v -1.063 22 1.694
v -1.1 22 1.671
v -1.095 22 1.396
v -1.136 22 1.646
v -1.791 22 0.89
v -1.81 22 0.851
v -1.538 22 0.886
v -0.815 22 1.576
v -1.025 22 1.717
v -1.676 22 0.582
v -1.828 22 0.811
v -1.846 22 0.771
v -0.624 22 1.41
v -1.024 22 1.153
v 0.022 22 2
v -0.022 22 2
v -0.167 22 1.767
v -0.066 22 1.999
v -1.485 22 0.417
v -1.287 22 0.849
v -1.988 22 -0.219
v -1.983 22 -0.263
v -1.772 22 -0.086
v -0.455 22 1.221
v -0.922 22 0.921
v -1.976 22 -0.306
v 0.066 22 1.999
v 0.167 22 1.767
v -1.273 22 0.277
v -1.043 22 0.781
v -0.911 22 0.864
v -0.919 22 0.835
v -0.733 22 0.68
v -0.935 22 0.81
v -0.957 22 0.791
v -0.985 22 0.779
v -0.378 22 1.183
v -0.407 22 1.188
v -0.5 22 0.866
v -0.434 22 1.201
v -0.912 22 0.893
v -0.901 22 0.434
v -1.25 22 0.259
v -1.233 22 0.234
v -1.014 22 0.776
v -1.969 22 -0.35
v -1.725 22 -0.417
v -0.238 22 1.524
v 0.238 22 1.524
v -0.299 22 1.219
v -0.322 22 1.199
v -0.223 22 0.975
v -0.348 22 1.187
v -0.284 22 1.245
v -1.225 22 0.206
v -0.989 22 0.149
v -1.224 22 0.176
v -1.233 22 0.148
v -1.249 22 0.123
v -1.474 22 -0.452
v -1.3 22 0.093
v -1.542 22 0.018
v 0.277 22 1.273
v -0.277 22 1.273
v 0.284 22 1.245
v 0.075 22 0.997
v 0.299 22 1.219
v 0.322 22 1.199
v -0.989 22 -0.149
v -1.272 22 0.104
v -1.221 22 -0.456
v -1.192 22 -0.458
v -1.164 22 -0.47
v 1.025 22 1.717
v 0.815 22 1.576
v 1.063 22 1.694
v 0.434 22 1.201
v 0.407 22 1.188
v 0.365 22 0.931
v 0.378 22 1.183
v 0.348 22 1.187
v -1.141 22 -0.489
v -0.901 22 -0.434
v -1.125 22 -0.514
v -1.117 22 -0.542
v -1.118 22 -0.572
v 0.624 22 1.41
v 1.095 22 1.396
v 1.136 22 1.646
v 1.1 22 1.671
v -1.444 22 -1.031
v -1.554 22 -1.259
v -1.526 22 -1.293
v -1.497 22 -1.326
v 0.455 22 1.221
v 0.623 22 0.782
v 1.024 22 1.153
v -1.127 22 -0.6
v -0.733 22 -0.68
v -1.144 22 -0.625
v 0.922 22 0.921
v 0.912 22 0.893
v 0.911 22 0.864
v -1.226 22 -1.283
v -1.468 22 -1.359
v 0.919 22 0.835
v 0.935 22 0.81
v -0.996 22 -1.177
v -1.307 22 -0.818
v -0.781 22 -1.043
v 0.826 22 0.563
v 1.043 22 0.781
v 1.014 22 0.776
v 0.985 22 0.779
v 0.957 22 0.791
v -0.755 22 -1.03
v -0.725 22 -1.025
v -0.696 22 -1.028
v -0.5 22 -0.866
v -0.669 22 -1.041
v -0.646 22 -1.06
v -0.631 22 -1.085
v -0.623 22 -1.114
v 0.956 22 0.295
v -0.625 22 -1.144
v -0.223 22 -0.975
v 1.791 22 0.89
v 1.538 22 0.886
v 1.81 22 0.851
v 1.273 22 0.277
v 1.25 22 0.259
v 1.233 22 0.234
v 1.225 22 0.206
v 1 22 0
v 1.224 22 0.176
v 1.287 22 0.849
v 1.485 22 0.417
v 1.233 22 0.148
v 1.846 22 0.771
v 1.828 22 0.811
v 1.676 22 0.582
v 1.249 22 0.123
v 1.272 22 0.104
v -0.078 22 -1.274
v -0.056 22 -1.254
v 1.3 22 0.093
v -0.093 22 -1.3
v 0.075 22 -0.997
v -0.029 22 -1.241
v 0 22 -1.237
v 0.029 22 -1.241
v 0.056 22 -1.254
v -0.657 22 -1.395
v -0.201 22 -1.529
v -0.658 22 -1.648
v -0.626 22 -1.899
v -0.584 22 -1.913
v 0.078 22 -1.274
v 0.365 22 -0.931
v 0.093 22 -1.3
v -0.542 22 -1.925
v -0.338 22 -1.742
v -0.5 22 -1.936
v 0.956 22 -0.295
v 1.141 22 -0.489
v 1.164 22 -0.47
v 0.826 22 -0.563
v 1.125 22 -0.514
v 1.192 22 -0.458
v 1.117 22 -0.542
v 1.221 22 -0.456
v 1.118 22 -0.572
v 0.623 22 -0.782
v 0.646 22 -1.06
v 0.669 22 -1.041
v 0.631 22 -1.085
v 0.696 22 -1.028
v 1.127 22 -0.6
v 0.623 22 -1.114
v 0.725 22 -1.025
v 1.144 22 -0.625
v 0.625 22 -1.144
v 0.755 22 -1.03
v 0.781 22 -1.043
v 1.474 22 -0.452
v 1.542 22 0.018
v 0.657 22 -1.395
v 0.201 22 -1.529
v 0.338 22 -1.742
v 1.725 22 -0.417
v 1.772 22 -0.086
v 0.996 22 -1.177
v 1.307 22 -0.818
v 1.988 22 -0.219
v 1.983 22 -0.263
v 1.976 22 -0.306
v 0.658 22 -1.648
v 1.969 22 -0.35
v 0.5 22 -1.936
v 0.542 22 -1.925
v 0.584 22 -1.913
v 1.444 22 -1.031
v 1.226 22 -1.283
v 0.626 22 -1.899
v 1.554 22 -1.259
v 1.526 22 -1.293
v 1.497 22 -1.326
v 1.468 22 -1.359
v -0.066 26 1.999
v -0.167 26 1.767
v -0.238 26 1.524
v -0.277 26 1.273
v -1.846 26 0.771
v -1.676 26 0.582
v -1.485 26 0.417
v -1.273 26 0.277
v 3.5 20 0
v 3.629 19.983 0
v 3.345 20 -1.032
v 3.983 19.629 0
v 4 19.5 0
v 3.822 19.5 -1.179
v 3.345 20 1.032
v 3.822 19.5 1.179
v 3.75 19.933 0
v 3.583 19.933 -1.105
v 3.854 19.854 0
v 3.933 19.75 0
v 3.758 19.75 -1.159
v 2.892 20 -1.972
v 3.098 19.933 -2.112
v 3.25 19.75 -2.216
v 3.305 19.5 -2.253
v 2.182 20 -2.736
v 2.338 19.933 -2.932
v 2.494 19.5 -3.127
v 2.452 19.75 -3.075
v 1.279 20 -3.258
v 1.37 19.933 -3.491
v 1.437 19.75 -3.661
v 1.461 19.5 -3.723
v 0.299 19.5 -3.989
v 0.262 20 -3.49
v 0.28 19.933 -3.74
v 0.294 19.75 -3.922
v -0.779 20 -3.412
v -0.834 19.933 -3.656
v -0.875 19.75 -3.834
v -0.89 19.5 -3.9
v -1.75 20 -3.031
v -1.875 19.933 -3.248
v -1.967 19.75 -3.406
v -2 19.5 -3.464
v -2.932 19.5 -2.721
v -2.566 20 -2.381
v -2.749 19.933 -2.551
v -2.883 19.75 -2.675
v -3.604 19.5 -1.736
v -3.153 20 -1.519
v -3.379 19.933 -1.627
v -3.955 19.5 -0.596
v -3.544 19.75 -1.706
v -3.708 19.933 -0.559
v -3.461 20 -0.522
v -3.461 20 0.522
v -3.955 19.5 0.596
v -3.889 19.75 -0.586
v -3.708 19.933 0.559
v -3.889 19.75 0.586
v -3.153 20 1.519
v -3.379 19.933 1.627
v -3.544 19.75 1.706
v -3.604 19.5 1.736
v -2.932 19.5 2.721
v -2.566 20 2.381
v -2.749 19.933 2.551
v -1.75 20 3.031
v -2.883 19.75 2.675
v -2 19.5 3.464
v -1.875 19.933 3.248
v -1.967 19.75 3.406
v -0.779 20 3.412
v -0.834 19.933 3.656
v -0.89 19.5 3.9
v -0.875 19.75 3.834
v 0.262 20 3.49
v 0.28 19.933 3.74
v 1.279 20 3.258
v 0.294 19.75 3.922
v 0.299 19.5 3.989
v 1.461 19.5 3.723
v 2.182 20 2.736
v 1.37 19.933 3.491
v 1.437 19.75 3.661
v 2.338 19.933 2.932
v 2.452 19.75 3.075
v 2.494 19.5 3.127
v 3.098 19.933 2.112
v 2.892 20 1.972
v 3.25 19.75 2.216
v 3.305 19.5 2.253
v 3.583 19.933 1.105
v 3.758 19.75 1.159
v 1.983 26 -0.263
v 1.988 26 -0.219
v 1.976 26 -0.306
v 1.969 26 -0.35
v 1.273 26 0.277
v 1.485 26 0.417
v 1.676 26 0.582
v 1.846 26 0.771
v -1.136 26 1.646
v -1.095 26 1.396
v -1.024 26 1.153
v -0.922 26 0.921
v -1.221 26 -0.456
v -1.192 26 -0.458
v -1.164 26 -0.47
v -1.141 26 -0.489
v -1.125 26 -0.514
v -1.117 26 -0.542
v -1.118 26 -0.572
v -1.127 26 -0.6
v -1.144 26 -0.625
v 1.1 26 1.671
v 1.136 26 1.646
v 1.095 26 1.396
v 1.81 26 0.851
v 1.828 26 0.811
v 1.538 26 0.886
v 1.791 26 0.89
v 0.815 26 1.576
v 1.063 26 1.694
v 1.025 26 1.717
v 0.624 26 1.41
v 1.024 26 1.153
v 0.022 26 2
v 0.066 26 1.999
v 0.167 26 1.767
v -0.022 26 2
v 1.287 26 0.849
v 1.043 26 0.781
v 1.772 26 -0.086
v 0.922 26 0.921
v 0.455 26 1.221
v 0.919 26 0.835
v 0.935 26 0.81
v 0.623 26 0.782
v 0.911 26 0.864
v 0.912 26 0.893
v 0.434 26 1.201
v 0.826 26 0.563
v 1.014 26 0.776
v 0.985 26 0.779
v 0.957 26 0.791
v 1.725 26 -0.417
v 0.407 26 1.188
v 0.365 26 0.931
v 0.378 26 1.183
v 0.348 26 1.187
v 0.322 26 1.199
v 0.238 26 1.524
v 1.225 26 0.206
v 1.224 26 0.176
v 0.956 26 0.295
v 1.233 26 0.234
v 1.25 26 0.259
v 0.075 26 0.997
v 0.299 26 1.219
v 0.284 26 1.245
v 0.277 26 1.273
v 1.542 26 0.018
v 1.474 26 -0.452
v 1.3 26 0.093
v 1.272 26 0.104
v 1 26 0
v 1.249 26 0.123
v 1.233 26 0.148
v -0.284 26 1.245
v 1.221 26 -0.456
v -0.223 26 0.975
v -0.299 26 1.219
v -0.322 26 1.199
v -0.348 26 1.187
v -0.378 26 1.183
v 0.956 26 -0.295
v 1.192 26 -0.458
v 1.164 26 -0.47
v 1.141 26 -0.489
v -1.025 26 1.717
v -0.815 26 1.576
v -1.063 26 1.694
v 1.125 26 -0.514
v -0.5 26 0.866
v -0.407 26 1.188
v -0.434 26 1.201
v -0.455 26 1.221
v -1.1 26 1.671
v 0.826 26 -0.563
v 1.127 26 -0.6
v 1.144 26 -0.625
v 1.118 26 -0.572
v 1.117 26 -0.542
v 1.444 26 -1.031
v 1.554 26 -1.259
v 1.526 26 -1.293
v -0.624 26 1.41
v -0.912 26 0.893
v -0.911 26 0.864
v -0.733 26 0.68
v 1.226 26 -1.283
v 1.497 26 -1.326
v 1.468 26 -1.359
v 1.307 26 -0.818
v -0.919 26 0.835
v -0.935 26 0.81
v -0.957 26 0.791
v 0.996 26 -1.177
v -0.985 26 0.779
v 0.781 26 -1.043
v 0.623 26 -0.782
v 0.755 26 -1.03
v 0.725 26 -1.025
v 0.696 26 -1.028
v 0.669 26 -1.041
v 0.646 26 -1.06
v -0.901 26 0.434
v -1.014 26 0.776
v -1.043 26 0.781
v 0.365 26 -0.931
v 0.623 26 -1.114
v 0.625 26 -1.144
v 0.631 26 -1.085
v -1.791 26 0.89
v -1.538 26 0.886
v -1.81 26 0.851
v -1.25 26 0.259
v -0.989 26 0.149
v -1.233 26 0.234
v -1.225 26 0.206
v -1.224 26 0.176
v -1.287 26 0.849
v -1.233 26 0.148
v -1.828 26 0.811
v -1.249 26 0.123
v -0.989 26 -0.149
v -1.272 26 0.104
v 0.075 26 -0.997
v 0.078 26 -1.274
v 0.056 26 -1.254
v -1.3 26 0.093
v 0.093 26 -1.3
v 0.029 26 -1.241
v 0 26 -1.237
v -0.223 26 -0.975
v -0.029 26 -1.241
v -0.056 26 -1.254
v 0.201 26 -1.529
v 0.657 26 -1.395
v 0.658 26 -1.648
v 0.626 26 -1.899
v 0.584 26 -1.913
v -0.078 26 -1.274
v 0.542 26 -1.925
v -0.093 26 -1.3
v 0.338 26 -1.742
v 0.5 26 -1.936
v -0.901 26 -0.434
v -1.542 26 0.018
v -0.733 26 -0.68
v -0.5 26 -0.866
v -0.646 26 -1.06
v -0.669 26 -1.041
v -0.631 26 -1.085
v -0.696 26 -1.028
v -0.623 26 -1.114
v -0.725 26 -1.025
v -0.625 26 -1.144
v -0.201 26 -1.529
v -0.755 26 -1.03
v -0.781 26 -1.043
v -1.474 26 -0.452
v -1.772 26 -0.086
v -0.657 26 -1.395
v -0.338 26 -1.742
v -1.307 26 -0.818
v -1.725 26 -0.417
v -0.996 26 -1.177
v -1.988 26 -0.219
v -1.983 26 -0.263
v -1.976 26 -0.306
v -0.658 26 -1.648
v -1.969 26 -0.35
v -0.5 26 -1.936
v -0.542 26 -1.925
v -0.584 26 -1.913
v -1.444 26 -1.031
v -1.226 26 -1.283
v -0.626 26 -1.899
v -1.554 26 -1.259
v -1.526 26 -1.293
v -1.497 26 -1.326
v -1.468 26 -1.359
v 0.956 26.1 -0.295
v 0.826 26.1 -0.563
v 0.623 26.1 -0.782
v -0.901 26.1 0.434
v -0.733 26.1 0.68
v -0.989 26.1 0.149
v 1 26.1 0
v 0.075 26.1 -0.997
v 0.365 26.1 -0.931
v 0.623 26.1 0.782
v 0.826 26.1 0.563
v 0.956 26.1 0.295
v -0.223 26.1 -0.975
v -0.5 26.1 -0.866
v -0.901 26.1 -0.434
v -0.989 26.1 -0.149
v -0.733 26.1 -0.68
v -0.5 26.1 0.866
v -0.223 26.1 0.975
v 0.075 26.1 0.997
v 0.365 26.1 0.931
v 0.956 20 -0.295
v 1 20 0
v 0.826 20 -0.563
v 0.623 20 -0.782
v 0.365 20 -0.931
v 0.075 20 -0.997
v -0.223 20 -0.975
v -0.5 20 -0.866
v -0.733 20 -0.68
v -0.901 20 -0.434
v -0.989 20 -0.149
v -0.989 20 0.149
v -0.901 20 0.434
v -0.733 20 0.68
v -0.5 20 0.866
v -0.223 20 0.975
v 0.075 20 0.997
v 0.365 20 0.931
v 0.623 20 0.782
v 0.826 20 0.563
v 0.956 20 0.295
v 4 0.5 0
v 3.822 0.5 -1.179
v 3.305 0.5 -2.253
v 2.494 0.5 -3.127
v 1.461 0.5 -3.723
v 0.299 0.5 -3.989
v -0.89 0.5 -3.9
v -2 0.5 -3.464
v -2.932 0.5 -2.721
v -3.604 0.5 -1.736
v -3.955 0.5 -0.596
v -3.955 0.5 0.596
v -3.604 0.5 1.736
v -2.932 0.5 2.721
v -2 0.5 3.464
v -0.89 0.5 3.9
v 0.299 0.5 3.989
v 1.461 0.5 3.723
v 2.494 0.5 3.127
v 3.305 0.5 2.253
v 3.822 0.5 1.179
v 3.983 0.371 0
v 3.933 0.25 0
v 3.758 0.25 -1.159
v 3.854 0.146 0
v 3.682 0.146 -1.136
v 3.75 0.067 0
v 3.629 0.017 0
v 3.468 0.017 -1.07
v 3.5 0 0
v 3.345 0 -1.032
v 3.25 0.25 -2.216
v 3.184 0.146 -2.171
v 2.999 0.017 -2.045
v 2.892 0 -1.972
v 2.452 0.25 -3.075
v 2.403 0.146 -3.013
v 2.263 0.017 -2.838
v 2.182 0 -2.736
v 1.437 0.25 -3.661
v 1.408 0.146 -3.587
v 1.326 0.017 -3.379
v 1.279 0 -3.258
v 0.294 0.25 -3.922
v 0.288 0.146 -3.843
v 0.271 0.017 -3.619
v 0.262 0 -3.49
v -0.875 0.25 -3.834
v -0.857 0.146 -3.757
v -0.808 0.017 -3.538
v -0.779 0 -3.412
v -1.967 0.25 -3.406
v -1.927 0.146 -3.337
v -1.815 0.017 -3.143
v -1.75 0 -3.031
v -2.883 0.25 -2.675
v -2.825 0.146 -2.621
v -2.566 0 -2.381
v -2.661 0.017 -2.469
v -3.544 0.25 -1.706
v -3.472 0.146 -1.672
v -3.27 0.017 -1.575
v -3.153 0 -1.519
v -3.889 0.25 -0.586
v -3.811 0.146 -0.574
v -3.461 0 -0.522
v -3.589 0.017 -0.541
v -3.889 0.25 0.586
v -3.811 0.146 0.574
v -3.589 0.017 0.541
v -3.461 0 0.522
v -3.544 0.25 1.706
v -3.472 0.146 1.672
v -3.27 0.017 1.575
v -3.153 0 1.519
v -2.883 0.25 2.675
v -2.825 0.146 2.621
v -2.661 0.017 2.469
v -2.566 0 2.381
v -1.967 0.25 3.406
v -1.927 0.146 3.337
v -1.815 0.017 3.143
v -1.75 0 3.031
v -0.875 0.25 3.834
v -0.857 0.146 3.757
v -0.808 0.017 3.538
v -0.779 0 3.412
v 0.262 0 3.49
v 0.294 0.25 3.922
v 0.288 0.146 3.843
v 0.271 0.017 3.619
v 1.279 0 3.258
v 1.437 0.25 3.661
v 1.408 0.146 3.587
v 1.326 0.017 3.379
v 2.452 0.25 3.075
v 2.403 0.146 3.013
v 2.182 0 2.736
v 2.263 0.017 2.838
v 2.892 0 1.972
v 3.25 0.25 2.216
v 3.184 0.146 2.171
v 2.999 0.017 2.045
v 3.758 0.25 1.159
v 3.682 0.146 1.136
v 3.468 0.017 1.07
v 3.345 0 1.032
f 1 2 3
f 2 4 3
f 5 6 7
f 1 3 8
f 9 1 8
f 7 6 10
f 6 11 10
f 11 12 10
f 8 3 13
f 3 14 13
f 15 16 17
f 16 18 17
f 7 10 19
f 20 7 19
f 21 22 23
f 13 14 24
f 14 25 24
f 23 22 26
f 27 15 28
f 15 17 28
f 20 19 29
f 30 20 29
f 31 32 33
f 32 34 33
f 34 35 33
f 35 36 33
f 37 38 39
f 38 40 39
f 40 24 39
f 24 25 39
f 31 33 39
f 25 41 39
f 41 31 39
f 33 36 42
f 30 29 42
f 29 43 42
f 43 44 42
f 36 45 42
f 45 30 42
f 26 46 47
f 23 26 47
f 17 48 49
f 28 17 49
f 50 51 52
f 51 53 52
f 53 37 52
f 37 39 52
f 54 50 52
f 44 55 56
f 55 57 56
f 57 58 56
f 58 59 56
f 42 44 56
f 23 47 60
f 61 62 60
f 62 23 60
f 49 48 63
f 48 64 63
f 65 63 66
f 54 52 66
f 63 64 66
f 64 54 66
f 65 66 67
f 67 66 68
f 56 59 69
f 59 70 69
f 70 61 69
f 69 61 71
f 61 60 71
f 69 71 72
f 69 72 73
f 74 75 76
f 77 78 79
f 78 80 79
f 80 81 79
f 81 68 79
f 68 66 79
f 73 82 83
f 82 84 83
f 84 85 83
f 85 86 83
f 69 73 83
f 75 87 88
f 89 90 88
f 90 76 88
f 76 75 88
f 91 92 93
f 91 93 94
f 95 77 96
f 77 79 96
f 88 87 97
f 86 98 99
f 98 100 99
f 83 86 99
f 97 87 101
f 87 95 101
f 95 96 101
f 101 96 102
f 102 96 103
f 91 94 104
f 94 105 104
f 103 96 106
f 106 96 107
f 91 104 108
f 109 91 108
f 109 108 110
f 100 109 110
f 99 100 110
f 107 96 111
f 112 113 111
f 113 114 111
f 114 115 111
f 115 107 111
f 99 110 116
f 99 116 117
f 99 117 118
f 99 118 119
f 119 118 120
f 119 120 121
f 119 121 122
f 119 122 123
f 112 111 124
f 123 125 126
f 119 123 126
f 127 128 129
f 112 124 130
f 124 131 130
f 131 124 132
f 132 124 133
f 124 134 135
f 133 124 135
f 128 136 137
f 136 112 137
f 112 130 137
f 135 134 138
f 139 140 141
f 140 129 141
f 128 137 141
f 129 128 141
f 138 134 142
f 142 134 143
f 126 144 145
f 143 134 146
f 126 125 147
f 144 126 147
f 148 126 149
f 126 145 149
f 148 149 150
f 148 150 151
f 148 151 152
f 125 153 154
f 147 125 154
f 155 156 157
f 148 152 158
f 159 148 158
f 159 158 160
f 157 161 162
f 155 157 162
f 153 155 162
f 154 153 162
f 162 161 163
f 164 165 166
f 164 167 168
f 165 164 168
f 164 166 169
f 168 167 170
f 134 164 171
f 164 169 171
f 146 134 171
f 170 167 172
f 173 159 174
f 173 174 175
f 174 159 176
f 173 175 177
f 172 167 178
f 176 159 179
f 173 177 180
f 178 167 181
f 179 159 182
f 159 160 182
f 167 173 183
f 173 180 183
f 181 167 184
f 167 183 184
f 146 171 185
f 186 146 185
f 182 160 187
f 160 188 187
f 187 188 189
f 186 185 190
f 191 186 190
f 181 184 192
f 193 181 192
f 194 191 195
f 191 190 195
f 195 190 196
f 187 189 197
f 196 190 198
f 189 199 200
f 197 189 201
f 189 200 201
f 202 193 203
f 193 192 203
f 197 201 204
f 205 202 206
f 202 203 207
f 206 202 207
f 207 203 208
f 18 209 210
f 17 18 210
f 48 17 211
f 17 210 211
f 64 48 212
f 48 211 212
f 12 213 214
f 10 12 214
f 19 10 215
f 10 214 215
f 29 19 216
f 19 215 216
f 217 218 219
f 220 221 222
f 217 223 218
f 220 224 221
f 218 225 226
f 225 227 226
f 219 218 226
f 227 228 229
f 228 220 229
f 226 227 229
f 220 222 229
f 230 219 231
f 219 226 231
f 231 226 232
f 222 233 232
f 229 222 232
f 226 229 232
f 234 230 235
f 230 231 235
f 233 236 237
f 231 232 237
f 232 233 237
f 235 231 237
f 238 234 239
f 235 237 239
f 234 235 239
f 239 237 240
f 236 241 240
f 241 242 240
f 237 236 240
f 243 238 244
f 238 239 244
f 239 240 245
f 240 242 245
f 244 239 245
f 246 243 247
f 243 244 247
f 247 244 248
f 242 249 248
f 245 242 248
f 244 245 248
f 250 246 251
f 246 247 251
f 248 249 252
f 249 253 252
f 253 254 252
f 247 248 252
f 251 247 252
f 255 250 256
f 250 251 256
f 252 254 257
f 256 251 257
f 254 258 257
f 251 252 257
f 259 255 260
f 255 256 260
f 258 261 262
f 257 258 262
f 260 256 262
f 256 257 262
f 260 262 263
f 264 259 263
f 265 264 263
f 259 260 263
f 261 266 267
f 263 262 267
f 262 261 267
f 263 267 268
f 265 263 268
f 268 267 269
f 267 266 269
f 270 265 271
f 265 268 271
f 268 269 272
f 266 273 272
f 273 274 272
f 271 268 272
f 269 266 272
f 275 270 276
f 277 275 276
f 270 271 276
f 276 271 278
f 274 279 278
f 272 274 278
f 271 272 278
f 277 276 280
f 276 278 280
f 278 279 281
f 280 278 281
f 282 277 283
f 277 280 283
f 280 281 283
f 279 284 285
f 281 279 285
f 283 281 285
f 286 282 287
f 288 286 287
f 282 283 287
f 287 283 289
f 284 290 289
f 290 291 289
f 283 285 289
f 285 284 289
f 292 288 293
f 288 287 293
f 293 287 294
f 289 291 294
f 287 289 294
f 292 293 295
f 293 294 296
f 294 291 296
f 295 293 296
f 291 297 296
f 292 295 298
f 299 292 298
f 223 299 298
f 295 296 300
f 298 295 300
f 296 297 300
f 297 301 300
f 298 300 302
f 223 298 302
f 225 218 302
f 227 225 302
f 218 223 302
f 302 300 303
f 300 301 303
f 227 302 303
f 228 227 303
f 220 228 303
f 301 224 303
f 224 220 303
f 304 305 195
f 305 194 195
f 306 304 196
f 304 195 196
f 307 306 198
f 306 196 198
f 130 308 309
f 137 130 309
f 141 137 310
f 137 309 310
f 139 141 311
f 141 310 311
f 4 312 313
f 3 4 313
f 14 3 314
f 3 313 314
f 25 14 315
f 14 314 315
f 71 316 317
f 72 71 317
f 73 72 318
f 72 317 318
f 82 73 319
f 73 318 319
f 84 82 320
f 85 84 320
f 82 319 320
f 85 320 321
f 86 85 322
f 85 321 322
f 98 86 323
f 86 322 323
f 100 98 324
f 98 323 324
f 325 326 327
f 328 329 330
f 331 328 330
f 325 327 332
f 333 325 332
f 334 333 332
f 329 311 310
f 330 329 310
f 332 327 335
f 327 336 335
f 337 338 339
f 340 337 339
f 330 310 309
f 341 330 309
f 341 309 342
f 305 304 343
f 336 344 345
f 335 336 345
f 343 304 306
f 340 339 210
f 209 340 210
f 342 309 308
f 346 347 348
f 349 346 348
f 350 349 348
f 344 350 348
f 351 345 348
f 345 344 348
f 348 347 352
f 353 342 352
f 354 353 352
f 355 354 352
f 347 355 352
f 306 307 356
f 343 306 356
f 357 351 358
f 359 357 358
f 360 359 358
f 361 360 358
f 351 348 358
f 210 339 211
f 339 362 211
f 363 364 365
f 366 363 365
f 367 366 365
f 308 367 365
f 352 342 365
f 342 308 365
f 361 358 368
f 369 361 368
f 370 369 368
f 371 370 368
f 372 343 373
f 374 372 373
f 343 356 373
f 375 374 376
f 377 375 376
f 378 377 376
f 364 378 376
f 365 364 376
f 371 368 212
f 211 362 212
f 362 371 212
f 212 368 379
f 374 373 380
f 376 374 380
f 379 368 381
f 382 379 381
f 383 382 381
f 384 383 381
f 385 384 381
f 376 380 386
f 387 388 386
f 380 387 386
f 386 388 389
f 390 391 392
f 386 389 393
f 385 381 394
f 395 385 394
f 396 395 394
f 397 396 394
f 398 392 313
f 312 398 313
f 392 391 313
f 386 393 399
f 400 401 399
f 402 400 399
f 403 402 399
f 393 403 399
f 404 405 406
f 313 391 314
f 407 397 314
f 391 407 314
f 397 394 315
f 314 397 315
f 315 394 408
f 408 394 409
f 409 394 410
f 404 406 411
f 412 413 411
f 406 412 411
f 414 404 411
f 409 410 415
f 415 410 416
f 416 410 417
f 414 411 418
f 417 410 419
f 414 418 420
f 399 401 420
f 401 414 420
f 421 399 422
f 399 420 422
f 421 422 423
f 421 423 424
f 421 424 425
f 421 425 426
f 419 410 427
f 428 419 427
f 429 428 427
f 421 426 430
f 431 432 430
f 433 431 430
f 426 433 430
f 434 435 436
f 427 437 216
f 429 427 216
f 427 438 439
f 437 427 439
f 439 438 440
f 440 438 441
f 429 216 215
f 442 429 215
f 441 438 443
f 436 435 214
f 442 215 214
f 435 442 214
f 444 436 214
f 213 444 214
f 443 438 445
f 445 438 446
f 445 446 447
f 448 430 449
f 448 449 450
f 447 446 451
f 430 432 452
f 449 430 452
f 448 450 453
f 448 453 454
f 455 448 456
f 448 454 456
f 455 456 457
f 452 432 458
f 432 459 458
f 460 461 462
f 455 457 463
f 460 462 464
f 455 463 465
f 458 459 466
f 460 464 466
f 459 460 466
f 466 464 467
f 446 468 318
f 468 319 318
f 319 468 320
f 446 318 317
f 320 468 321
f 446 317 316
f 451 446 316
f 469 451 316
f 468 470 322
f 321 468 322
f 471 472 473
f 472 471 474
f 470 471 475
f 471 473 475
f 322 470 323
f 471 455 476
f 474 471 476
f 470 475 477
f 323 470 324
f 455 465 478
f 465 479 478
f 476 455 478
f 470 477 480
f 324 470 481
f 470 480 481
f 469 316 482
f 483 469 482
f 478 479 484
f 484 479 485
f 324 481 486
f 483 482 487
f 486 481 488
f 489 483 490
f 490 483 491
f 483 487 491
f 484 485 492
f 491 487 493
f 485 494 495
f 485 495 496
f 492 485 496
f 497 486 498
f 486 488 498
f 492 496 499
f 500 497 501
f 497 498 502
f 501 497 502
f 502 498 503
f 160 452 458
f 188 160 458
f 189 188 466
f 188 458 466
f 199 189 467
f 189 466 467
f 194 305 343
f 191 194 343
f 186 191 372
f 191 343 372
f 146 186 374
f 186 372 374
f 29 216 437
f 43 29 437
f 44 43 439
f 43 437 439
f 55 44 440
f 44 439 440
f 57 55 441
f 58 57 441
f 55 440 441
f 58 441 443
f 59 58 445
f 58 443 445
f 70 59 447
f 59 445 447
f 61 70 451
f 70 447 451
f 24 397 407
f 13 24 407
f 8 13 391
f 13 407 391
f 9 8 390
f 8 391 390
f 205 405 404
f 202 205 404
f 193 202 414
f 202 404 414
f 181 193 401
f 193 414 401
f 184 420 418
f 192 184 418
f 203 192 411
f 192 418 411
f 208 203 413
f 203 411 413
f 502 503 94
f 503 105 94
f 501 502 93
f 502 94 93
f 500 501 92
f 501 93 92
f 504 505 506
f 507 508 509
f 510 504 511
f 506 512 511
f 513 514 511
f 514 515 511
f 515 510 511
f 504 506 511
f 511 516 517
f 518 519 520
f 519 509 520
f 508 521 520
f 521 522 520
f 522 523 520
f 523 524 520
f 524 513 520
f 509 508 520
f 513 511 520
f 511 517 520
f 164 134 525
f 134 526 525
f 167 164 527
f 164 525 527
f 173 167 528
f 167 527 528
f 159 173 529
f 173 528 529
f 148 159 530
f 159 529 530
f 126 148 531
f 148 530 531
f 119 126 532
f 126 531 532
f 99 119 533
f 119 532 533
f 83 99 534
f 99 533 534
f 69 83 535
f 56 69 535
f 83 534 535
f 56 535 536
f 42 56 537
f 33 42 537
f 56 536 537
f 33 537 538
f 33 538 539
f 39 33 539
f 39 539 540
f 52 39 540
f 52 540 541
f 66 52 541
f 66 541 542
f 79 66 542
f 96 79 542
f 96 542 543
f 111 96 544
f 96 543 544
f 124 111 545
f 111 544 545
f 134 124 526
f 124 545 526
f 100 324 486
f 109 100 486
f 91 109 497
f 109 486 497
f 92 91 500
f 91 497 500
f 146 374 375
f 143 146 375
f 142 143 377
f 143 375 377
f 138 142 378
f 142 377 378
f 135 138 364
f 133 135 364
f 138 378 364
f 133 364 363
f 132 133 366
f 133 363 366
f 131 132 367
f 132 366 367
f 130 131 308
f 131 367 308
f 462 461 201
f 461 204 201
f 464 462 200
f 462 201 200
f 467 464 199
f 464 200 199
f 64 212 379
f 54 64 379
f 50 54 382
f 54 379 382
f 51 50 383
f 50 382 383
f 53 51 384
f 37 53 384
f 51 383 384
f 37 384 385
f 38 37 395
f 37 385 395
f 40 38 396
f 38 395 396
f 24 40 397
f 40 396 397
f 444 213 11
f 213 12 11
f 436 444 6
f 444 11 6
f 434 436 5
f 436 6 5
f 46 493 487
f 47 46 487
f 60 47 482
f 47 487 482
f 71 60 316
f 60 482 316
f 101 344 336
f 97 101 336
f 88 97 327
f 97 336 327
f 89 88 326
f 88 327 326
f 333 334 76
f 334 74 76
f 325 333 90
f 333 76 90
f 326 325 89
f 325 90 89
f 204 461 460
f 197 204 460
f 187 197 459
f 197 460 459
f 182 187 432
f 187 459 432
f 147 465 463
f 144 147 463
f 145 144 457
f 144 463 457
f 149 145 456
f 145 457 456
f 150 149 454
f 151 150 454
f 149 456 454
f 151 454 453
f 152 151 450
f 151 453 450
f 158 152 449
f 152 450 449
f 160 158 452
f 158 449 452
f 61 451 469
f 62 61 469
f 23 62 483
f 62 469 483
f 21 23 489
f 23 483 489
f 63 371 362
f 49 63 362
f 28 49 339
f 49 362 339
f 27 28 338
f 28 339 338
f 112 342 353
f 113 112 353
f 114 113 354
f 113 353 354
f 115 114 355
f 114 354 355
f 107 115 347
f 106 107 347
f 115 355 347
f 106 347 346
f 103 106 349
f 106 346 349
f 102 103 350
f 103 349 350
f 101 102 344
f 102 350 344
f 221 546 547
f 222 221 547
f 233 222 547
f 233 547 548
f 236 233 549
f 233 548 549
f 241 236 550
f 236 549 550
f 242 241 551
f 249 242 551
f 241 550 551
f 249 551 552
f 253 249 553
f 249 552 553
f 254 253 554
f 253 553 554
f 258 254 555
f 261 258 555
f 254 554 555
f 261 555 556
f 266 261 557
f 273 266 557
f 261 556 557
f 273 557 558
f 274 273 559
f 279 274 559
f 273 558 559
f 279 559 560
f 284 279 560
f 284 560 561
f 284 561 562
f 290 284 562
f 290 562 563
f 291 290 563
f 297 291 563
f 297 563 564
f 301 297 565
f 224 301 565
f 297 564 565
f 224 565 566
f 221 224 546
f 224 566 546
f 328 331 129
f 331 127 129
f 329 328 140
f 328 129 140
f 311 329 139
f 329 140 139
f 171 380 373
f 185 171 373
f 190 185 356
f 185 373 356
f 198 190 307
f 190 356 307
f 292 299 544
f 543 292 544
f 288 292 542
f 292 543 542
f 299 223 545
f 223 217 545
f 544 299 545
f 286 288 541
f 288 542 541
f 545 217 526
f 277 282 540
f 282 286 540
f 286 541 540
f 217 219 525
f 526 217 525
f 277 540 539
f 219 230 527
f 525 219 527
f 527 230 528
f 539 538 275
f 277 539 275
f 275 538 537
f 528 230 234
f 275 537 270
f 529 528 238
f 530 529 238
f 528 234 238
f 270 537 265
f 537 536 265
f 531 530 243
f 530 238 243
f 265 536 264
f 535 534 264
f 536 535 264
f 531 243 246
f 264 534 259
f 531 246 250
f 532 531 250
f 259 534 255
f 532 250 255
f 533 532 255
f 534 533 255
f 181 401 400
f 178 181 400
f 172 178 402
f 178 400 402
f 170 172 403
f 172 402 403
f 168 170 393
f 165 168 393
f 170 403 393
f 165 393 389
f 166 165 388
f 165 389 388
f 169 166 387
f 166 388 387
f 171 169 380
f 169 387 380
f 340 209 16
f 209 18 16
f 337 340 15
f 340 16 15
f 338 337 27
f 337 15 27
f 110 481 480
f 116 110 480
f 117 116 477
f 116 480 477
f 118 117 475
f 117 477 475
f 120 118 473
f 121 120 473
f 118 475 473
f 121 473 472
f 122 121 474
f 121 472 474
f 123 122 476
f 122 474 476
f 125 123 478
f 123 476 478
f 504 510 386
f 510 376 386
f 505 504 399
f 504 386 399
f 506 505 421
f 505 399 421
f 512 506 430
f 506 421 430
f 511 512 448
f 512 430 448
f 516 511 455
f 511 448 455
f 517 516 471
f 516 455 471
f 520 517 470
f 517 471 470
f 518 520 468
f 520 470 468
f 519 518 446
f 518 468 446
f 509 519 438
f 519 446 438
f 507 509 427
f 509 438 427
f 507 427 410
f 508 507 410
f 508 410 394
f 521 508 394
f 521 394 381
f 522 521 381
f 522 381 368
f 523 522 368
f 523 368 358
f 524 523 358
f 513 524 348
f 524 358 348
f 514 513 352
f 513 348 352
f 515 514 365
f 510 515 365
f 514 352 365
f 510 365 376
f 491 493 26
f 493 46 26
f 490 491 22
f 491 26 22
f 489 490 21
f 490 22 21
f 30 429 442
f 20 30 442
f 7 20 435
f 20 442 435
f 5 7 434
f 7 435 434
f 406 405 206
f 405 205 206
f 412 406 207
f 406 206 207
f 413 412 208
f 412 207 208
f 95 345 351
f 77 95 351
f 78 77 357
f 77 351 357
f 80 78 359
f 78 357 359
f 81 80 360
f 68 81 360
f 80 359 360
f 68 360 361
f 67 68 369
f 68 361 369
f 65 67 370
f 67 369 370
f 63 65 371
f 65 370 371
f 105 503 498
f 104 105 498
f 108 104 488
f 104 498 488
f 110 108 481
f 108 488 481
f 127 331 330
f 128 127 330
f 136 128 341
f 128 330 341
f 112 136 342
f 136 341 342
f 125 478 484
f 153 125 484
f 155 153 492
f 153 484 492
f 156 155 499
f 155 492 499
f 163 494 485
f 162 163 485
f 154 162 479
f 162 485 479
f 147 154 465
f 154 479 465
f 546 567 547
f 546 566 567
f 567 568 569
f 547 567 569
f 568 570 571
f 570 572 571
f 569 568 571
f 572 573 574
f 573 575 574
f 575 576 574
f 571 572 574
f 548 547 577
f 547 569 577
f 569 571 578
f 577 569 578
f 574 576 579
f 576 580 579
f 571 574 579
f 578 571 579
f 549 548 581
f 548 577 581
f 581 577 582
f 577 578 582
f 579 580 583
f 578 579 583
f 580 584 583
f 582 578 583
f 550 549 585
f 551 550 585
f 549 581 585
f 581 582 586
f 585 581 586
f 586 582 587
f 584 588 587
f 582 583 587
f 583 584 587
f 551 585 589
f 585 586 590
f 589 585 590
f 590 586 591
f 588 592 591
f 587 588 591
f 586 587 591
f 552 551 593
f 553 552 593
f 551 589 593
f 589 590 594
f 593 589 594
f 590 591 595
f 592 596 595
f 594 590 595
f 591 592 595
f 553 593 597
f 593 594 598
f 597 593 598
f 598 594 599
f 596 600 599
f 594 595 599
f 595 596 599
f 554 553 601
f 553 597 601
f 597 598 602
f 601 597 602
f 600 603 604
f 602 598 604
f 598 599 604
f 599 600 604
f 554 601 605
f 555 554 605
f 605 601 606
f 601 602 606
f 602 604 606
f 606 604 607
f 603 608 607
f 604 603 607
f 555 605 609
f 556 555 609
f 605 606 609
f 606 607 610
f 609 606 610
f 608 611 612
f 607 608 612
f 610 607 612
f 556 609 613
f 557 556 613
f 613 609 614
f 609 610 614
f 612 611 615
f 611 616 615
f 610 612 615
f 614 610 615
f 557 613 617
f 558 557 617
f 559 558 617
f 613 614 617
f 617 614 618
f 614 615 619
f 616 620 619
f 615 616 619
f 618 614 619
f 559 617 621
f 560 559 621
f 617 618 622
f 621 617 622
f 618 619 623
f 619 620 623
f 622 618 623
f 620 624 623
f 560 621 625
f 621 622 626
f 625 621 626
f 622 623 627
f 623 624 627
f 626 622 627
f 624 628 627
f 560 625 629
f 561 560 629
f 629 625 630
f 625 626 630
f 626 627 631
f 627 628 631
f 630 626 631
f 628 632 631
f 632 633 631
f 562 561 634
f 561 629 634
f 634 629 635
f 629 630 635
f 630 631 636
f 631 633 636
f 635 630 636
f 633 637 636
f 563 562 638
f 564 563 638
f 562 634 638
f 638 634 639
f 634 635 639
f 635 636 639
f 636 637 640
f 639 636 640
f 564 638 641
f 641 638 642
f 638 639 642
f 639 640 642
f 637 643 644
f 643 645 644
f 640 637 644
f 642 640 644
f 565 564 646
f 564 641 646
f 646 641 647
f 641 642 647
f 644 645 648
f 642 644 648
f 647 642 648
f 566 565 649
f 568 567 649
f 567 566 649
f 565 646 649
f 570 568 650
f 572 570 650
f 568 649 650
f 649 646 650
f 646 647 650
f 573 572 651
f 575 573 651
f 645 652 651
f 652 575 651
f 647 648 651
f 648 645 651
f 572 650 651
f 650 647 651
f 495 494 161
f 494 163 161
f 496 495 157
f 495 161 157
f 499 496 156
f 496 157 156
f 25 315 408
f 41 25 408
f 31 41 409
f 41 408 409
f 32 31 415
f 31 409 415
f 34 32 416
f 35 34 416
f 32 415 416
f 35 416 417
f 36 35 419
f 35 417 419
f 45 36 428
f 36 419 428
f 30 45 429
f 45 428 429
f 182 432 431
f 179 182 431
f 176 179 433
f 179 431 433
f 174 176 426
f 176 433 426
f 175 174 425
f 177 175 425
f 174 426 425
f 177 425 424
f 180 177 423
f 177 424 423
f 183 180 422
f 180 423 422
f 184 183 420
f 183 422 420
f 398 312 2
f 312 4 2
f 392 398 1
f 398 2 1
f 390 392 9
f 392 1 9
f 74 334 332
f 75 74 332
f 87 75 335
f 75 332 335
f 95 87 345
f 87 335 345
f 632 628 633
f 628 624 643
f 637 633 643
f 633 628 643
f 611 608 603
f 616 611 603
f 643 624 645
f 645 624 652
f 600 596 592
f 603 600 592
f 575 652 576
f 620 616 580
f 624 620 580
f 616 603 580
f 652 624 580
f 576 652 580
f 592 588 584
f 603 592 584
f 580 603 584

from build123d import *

# Parameters (mm, degrees)
FILLET1_R          = 0.5
CUT_EXTRUDE1_DEPTH = 4
CIRPATTERN1_COUNT  = 11


with BuildPart() as part:
    # Sketch3 → Revolve1 (revolve)
    with BuildSketch(Plane.XY):
        Polygon((0, 0), (0, 26.1), (1, 26.1), (1, 26), (2, 26), (2, 22), (1, 22), (1, 20), (4, 20), (4, 0), align=None)
    revolve(axis=Axis((0, 0, 0), (0, 1, 0)))

    # Fillet1
    fillet1_edges = [part.edges().sort_by_distance(p)[0] for p in [
        (-4, 20, 0),
        (-4, 0, 0),
    ]]
    fillet(fillet1_edges, radius=FILLET1_R)

    # Sketch4 → Cut-Extrude1 (cut)
    with BuildSketch(Plane(origin=(0, 26, 0), x_dir=(1, 0, 0), z_dir=(0, 1, 0))):
        with BuildLine():
            ThreePointArc((-0.5, 1.936491673), (-0.266119458, 1.637619869), (-0.092905413, 1.299949383))
            ThreePointArc((-0.092905413, 1.299949383), (0, 1.236943764), (0.092905413, 1.299949383))
            ThreePointArc((0.092905413, 1.299949383), (0.266119458, 1.637619869), (0.5, 1.936491673))
            ThreePointArc((0.5, 1.936491673), (0, 2), (-0.5, 1.936491673))
        make_face()
    cut_extrude1 = extrude(amount=-CUT_EXTRUDE1_DEPTH, mode=Mode.SUBTRACT)

    # CirPattern1: Cut-Extrude1 ×11 about axis
    cirpattern1_axis = Axis((0, 0, 0), (0, 1, 0))
    for i in range(1, CIRPATTERN1_COUNT):
        add(cut_extrude1.rotate(cirpattern1_axis, i * 360 / CIRPATTERN1_COUNT), mode=Mode.SUBTRACT)


solid = part.part
